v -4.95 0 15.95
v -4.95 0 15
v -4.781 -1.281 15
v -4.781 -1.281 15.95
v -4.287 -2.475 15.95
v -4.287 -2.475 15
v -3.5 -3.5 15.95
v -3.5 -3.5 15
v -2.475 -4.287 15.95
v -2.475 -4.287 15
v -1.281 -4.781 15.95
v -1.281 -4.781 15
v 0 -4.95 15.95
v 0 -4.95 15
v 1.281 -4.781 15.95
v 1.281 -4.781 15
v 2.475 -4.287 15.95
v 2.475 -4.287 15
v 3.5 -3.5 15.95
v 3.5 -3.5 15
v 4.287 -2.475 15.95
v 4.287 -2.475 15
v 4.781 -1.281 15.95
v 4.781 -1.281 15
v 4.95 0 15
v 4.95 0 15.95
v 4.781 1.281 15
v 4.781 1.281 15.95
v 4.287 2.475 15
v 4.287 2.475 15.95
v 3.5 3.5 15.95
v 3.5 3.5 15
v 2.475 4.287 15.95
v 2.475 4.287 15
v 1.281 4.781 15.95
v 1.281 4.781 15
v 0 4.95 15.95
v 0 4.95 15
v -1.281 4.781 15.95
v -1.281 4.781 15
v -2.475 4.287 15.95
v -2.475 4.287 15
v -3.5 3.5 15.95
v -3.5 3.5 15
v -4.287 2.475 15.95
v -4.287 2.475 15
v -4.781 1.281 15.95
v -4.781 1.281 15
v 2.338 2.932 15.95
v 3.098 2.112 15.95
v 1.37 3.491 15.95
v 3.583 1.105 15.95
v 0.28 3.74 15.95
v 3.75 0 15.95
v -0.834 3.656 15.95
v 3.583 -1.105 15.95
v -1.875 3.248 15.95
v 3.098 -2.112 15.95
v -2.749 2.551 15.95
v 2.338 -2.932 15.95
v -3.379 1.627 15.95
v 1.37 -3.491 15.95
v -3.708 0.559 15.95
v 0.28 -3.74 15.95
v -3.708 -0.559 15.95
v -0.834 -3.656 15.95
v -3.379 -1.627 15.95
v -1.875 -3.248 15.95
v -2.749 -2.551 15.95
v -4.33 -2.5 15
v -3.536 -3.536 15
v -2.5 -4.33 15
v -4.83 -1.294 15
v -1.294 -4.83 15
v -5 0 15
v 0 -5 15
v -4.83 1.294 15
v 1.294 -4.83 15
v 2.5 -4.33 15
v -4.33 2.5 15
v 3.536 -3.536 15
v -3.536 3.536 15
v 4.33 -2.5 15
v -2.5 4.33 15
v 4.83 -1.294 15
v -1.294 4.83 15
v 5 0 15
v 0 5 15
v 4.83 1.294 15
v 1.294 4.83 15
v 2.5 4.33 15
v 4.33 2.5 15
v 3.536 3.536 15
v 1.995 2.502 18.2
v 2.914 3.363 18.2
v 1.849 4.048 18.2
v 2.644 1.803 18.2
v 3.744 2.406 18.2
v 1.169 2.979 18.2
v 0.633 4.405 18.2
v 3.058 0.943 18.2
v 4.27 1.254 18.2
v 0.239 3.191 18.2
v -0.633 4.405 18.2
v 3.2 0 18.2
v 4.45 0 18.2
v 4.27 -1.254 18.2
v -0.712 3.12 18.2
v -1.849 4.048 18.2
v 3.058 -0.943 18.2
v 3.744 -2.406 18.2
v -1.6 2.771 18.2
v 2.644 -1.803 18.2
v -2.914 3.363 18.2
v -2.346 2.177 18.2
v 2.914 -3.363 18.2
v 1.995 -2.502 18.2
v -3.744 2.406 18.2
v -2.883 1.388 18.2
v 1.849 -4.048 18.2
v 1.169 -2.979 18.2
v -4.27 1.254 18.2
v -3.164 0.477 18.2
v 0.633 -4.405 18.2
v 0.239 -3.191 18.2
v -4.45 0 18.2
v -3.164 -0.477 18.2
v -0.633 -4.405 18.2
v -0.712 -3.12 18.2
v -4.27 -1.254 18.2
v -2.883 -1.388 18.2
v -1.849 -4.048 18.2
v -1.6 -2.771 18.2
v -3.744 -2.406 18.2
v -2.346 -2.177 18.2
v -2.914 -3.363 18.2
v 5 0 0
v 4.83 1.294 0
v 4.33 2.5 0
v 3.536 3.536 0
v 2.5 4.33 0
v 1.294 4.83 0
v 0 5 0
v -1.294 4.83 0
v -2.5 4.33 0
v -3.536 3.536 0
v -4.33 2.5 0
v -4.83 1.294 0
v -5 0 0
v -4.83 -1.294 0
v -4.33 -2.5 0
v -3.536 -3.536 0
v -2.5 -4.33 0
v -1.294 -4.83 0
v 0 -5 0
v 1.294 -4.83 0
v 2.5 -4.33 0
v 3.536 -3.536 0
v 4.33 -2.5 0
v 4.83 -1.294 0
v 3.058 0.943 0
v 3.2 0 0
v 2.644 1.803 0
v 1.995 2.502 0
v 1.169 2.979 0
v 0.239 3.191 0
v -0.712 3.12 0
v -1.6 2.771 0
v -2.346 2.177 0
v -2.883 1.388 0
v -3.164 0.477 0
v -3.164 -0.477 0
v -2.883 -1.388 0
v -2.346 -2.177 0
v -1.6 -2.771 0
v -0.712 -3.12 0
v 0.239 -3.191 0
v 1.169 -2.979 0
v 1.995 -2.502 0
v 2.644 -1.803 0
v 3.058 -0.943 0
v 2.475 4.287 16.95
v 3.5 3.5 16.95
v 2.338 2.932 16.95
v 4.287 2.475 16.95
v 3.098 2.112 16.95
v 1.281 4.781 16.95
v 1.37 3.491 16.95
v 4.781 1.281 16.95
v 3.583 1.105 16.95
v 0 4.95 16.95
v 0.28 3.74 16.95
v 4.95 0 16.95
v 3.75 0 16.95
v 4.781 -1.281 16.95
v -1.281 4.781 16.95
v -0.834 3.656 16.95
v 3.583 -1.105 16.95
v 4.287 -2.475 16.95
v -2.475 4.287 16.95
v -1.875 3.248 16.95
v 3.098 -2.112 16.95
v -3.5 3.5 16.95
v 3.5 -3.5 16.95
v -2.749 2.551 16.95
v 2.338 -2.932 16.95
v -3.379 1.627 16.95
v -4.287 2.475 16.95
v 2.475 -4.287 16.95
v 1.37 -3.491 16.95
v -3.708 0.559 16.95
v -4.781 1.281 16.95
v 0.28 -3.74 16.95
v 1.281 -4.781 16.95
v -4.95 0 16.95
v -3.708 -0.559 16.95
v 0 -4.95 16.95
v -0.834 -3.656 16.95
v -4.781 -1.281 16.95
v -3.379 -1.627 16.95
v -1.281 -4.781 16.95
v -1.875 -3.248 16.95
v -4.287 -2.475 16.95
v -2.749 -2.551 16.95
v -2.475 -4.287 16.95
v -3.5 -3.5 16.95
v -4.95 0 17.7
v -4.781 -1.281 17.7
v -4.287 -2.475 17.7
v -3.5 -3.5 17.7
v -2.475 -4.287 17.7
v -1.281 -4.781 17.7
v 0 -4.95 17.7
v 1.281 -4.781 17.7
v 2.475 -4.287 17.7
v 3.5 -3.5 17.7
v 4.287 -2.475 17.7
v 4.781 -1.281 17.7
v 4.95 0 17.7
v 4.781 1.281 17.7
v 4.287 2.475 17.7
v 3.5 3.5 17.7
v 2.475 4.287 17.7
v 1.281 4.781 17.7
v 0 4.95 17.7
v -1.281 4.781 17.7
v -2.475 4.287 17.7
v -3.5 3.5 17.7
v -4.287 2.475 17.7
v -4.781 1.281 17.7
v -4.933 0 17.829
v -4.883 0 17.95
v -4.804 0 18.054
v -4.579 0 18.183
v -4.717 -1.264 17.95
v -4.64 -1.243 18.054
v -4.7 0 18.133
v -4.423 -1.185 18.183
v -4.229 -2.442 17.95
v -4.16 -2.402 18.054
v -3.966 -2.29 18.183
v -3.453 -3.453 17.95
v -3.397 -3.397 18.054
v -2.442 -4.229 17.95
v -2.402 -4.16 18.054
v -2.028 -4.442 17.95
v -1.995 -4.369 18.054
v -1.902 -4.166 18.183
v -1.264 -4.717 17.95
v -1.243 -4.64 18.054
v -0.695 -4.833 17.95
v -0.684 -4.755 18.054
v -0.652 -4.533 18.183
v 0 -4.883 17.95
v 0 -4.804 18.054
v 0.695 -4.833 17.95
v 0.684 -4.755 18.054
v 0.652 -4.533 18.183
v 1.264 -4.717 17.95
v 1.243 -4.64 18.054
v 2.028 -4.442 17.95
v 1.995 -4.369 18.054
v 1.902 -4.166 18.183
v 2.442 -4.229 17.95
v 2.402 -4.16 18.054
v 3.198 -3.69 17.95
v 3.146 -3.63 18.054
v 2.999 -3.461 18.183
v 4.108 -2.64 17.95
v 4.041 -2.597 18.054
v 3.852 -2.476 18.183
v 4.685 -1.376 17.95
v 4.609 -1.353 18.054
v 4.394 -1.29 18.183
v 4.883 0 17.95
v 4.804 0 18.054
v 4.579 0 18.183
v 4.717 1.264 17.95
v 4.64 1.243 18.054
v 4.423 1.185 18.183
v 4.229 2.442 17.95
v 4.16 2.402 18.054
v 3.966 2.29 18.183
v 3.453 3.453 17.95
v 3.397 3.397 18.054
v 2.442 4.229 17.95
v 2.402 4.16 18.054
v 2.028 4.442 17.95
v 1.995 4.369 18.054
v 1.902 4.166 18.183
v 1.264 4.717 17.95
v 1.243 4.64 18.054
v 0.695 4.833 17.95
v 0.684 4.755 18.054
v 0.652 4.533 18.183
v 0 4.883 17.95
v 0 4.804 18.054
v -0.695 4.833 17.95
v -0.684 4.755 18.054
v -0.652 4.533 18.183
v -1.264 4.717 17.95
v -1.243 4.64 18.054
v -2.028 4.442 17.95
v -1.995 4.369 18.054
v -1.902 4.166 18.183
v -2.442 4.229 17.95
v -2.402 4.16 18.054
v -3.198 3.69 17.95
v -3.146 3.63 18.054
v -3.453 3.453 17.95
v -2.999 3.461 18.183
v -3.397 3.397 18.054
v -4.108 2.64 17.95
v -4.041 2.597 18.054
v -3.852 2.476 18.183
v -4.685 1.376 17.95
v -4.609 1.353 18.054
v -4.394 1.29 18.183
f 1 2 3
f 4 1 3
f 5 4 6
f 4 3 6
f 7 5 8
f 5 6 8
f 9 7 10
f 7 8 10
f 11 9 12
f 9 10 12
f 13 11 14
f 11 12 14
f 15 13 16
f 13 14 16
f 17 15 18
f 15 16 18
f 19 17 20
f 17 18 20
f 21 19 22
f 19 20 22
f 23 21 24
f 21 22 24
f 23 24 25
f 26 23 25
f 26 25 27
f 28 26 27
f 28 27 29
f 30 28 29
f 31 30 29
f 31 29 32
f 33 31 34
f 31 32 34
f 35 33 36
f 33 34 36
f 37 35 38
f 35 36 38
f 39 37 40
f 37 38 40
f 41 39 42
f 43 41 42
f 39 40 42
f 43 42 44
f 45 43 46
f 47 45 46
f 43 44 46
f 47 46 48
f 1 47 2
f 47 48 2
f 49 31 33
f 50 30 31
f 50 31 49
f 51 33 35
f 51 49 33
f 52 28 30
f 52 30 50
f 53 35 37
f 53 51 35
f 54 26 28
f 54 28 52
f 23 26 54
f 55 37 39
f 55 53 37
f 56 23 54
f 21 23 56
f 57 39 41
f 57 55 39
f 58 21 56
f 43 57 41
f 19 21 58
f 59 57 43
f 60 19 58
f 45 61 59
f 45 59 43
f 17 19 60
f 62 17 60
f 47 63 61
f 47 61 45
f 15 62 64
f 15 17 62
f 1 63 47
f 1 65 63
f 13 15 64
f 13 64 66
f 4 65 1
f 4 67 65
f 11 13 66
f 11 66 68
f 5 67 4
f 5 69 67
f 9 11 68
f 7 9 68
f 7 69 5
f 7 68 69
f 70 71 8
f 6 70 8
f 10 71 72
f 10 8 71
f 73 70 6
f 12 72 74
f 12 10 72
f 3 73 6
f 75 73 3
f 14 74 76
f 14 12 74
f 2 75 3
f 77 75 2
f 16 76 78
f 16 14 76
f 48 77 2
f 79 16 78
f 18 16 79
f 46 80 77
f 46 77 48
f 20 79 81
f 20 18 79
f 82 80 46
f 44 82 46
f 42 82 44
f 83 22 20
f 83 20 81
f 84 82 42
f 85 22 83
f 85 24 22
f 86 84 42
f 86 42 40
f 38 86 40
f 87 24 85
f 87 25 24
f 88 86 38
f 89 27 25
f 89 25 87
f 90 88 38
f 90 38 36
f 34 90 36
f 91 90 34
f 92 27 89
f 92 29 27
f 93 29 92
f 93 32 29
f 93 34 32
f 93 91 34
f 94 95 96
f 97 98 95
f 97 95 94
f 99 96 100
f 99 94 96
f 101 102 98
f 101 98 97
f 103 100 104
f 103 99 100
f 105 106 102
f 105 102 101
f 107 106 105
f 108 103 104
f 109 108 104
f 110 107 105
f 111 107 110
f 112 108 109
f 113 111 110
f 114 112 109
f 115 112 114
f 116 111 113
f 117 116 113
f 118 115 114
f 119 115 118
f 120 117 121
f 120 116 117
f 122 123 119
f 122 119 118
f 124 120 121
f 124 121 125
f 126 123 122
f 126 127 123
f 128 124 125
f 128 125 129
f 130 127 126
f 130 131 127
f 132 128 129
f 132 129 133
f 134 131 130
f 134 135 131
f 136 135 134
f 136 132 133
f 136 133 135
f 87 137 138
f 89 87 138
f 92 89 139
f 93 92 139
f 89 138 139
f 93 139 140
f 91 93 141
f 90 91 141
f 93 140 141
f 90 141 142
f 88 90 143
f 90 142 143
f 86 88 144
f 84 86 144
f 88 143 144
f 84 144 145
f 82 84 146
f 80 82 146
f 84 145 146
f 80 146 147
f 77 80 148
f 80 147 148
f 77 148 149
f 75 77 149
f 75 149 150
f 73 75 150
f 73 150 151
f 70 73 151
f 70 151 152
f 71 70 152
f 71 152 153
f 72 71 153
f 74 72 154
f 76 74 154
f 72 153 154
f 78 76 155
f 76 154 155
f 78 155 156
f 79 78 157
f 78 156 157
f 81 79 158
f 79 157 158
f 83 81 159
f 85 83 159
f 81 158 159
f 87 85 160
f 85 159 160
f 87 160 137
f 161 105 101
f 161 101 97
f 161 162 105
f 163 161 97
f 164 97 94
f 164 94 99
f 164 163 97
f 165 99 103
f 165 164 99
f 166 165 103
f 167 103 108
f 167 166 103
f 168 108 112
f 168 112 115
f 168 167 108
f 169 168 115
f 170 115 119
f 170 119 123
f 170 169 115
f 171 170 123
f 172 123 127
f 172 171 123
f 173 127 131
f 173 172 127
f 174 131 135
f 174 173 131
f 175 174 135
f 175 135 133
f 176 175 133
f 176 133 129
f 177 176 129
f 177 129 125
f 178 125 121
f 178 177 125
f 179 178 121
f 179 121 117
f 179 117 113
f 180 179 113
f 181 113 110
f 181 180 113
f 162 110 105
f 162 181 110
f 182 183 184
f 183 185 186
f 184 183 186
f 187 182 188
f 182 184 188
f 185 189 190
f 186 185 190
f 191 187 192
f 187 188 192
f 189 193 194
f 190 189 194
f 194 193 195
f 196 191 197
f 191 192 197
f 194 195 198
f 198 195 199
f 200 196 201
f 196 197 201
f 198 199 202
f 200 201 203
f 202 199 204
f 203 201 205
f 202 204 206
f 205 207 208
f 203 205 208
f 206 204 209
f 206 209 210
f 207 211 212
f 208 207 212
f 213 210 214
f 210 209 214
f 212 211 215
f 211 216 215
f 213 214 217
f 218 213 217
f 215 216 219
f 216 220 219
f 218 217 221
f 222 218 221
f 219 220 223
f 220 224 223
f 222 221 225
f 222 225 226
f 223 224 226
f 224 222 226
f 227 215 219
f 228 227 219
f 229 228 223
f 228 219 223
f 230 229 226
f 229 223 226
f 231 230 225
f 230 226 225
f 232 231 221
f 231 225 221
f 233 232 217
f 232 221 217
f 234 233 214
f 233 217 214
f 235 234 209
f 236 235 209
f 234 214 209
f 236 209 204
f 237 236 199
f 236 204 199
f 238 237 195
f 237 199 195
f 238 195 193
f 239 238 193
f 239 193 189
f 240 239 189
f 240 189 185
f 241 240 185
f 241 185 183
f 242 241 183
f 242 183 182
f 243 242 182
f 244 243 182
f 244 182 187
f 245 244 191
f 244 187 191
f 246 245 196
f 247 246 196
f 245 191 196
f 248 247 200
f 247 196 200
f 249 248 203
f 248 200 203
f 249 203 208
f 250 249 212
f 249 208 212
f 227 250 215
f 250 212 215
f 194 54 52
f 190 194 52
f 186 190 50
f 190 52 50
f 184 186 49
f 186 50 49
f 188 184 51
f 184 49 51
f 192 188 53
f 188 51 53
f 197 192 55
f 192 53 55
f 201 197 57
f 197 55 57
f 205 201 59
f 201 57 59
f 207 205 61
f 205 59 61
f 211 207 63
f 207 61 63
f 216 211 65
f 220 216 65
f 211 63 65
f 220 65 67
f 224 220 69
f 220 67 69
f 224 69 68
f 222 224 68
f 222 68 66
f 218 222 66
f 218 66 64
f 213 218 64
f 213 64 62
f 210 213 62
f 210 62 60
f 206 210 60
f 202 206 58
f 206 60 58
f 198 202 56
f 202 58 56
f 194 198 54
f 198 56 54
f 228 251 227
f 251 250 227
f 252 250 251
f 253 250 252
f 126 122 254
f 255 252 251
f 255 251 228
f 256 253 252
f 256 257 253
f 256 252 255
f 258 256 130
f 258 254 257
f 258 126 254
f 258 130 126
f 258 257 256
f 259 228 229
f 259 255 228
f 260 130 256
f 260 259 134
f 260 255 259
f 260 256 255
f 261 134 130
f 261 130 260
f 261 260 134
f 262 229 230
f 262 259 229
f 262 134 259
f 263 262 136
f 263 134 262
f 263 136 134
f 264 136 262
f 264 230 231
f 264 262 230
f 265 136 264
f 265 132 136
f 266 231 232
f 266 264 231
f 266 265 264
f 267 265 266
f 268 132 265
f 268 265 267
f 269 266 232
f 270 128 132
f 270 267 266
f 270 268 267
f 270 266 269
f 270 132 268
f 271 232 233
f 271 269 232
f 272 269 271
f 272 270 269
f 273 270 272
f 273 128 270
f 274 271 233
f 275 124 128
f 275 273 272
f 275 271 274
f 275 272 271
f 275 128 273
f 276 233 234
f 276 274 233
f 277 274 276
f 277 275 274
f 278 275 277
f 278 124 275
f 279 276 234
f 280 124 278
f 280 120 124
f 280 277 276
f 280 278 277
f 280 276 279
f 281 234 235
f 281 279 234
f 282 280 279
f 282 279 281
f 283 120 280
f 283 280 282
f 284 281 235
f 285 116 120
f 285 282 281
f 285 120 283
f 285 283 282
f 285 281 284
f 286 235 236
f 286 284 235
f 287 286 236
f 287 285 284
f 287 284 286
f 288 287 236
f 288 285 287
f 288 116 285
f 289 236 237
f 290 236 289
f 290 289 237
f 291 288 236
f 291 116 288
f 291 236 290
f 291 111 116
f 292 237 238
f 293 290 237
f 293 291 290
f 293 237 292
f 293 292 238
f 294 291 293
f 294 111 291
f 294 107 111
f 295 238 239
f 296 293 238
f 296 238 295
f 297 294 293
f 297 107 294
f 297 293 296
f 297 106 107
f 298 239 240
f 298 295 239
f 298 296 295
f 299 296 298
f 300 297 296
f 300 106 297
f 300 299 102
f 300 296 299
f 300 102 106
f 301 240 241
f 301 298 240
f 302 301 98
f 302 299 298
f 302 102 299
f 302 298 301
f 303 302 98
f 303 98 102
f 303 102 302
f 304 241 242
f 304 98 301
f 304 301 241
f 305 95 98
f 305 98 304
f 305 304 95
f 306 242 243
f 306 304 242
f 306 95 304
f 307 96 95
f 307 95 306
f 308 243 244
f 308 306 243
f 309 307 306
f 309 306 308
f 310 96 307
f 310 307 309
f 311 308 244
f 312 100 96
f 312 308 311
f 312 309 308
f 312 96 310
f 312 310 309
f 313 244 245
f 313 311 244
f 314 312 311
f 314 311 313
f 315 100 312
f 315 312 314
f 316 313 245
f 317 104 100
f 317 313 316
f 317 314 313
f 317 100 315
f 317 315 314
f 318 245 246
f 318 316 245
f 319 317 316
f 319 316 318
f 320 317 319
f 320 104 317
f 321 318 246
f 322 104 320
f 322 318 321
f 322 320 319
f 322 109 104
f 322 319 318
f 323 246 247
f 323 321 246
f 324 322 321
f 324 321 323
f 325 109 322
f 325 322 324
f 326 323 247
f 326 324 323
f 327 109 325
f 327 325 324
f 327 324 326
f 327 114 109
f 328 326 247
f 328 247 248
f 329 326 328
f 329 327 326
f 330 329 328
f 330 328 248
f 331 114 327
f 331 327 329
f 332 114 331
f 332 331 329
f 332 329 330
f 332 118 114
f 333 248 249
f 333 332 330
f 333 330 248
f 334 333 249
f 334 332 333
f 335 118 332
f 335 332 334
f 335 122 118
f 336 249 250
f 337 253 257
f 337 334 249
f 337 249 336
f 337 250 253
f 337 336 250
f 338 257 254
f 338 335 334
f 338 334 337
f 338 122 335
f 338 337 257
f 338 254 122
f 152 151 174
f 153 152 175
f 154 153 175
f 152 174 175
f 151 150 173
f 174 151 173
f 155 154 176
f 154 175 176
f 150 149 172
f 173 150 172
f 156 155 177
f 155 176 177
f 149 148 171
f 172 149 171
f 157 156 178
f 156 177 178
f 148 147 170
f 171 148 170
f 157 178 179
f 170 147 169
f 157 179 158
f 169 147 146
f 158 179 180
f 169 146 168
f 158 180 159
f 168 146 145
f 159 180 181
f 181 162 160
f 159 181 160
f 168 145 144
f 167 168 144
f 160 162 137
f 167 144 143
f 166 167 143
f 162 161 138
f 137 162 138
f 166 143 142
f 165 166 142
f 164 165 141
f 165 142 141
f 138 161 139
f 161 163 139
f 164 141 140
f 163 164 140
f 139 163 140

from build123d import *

# Parameters (mm, degrees)
INSERT_SKETCH_R       = 5
INSERT_SKETCH_R_2     = 3.2
INSERT_DEPTH          = 15
SKETCH2_R             = 4.95
SKETCH2_R_2           = 3.2
CHUCK_SHOULDER_DEPTH  = 0.95
SKETCH4_R             = 3.75
SKETCH4_R_2           = 3.2
CHUCK_MINOR_DIA_DEPTH = 1
SKETCH5_R             = 4.95
SKETCH5_R_2           = 3.2
CHUCK_TOP_DEPTH       = 1.25
CHUCK_TOP_FILLET_R    = 0.5


with BuildPart() as part:
    # Insert Sketch → Insert (new body)
    with BuildSketch(Plane.XY):
        Circle(INSERT_SKETCH_R)
        Circle(INSERT_SKETCH_R_2, mode=Mode.SUBTRACT)
    extrude(amount=INSERT_DEPTH)

    # Sketch2 → chuck shoulder (add)
    with BuildSketch(Plane.XY.offset(15)):
        with Locations(Location((0, 0, 0), (0, 0, 180))):
            Circle(SKETCH2_R)
        Circle(SKETCH2_R_2, mode=Mode.SUBTRACT)
    extrude(amount=CHUCK_SHOULDER_DEPTH)

    # Sketch4 → chuck minor dia (add)
    with BuildSketch(Plane.XY.offset(15.95)):
        Circle(SKETCH4_R)
        Circle(SKETCH4_R_2, mode=Mode.SUBTRACT)
    extrude(amount=CHUCK_MINOR_DIA_DEPTH)

    # Sketch5 → chuck top (add)
    with BuildSketch(Plane.XY.offset(16.95)):
        with Locations(Location((0, 0, 0), (0, 0, 180))):
            Circle(SKETCH5_R)
        Circle(SKETCH5_R_2, mode=Mode.SUBTRACT)
    extrude(amount=CHUCK_TOP_DEPTH)

    # chuck top fillet
    chuck_top_fillet_edges = [part.edges().sort_by_distance(p)[0] for p in [
        (4.95, 0, 18.2),
    ]]
    fillet(chuck_top_fillet_edges, radius=CHUCK_TOP_FILLET_R)


solid = part.part
